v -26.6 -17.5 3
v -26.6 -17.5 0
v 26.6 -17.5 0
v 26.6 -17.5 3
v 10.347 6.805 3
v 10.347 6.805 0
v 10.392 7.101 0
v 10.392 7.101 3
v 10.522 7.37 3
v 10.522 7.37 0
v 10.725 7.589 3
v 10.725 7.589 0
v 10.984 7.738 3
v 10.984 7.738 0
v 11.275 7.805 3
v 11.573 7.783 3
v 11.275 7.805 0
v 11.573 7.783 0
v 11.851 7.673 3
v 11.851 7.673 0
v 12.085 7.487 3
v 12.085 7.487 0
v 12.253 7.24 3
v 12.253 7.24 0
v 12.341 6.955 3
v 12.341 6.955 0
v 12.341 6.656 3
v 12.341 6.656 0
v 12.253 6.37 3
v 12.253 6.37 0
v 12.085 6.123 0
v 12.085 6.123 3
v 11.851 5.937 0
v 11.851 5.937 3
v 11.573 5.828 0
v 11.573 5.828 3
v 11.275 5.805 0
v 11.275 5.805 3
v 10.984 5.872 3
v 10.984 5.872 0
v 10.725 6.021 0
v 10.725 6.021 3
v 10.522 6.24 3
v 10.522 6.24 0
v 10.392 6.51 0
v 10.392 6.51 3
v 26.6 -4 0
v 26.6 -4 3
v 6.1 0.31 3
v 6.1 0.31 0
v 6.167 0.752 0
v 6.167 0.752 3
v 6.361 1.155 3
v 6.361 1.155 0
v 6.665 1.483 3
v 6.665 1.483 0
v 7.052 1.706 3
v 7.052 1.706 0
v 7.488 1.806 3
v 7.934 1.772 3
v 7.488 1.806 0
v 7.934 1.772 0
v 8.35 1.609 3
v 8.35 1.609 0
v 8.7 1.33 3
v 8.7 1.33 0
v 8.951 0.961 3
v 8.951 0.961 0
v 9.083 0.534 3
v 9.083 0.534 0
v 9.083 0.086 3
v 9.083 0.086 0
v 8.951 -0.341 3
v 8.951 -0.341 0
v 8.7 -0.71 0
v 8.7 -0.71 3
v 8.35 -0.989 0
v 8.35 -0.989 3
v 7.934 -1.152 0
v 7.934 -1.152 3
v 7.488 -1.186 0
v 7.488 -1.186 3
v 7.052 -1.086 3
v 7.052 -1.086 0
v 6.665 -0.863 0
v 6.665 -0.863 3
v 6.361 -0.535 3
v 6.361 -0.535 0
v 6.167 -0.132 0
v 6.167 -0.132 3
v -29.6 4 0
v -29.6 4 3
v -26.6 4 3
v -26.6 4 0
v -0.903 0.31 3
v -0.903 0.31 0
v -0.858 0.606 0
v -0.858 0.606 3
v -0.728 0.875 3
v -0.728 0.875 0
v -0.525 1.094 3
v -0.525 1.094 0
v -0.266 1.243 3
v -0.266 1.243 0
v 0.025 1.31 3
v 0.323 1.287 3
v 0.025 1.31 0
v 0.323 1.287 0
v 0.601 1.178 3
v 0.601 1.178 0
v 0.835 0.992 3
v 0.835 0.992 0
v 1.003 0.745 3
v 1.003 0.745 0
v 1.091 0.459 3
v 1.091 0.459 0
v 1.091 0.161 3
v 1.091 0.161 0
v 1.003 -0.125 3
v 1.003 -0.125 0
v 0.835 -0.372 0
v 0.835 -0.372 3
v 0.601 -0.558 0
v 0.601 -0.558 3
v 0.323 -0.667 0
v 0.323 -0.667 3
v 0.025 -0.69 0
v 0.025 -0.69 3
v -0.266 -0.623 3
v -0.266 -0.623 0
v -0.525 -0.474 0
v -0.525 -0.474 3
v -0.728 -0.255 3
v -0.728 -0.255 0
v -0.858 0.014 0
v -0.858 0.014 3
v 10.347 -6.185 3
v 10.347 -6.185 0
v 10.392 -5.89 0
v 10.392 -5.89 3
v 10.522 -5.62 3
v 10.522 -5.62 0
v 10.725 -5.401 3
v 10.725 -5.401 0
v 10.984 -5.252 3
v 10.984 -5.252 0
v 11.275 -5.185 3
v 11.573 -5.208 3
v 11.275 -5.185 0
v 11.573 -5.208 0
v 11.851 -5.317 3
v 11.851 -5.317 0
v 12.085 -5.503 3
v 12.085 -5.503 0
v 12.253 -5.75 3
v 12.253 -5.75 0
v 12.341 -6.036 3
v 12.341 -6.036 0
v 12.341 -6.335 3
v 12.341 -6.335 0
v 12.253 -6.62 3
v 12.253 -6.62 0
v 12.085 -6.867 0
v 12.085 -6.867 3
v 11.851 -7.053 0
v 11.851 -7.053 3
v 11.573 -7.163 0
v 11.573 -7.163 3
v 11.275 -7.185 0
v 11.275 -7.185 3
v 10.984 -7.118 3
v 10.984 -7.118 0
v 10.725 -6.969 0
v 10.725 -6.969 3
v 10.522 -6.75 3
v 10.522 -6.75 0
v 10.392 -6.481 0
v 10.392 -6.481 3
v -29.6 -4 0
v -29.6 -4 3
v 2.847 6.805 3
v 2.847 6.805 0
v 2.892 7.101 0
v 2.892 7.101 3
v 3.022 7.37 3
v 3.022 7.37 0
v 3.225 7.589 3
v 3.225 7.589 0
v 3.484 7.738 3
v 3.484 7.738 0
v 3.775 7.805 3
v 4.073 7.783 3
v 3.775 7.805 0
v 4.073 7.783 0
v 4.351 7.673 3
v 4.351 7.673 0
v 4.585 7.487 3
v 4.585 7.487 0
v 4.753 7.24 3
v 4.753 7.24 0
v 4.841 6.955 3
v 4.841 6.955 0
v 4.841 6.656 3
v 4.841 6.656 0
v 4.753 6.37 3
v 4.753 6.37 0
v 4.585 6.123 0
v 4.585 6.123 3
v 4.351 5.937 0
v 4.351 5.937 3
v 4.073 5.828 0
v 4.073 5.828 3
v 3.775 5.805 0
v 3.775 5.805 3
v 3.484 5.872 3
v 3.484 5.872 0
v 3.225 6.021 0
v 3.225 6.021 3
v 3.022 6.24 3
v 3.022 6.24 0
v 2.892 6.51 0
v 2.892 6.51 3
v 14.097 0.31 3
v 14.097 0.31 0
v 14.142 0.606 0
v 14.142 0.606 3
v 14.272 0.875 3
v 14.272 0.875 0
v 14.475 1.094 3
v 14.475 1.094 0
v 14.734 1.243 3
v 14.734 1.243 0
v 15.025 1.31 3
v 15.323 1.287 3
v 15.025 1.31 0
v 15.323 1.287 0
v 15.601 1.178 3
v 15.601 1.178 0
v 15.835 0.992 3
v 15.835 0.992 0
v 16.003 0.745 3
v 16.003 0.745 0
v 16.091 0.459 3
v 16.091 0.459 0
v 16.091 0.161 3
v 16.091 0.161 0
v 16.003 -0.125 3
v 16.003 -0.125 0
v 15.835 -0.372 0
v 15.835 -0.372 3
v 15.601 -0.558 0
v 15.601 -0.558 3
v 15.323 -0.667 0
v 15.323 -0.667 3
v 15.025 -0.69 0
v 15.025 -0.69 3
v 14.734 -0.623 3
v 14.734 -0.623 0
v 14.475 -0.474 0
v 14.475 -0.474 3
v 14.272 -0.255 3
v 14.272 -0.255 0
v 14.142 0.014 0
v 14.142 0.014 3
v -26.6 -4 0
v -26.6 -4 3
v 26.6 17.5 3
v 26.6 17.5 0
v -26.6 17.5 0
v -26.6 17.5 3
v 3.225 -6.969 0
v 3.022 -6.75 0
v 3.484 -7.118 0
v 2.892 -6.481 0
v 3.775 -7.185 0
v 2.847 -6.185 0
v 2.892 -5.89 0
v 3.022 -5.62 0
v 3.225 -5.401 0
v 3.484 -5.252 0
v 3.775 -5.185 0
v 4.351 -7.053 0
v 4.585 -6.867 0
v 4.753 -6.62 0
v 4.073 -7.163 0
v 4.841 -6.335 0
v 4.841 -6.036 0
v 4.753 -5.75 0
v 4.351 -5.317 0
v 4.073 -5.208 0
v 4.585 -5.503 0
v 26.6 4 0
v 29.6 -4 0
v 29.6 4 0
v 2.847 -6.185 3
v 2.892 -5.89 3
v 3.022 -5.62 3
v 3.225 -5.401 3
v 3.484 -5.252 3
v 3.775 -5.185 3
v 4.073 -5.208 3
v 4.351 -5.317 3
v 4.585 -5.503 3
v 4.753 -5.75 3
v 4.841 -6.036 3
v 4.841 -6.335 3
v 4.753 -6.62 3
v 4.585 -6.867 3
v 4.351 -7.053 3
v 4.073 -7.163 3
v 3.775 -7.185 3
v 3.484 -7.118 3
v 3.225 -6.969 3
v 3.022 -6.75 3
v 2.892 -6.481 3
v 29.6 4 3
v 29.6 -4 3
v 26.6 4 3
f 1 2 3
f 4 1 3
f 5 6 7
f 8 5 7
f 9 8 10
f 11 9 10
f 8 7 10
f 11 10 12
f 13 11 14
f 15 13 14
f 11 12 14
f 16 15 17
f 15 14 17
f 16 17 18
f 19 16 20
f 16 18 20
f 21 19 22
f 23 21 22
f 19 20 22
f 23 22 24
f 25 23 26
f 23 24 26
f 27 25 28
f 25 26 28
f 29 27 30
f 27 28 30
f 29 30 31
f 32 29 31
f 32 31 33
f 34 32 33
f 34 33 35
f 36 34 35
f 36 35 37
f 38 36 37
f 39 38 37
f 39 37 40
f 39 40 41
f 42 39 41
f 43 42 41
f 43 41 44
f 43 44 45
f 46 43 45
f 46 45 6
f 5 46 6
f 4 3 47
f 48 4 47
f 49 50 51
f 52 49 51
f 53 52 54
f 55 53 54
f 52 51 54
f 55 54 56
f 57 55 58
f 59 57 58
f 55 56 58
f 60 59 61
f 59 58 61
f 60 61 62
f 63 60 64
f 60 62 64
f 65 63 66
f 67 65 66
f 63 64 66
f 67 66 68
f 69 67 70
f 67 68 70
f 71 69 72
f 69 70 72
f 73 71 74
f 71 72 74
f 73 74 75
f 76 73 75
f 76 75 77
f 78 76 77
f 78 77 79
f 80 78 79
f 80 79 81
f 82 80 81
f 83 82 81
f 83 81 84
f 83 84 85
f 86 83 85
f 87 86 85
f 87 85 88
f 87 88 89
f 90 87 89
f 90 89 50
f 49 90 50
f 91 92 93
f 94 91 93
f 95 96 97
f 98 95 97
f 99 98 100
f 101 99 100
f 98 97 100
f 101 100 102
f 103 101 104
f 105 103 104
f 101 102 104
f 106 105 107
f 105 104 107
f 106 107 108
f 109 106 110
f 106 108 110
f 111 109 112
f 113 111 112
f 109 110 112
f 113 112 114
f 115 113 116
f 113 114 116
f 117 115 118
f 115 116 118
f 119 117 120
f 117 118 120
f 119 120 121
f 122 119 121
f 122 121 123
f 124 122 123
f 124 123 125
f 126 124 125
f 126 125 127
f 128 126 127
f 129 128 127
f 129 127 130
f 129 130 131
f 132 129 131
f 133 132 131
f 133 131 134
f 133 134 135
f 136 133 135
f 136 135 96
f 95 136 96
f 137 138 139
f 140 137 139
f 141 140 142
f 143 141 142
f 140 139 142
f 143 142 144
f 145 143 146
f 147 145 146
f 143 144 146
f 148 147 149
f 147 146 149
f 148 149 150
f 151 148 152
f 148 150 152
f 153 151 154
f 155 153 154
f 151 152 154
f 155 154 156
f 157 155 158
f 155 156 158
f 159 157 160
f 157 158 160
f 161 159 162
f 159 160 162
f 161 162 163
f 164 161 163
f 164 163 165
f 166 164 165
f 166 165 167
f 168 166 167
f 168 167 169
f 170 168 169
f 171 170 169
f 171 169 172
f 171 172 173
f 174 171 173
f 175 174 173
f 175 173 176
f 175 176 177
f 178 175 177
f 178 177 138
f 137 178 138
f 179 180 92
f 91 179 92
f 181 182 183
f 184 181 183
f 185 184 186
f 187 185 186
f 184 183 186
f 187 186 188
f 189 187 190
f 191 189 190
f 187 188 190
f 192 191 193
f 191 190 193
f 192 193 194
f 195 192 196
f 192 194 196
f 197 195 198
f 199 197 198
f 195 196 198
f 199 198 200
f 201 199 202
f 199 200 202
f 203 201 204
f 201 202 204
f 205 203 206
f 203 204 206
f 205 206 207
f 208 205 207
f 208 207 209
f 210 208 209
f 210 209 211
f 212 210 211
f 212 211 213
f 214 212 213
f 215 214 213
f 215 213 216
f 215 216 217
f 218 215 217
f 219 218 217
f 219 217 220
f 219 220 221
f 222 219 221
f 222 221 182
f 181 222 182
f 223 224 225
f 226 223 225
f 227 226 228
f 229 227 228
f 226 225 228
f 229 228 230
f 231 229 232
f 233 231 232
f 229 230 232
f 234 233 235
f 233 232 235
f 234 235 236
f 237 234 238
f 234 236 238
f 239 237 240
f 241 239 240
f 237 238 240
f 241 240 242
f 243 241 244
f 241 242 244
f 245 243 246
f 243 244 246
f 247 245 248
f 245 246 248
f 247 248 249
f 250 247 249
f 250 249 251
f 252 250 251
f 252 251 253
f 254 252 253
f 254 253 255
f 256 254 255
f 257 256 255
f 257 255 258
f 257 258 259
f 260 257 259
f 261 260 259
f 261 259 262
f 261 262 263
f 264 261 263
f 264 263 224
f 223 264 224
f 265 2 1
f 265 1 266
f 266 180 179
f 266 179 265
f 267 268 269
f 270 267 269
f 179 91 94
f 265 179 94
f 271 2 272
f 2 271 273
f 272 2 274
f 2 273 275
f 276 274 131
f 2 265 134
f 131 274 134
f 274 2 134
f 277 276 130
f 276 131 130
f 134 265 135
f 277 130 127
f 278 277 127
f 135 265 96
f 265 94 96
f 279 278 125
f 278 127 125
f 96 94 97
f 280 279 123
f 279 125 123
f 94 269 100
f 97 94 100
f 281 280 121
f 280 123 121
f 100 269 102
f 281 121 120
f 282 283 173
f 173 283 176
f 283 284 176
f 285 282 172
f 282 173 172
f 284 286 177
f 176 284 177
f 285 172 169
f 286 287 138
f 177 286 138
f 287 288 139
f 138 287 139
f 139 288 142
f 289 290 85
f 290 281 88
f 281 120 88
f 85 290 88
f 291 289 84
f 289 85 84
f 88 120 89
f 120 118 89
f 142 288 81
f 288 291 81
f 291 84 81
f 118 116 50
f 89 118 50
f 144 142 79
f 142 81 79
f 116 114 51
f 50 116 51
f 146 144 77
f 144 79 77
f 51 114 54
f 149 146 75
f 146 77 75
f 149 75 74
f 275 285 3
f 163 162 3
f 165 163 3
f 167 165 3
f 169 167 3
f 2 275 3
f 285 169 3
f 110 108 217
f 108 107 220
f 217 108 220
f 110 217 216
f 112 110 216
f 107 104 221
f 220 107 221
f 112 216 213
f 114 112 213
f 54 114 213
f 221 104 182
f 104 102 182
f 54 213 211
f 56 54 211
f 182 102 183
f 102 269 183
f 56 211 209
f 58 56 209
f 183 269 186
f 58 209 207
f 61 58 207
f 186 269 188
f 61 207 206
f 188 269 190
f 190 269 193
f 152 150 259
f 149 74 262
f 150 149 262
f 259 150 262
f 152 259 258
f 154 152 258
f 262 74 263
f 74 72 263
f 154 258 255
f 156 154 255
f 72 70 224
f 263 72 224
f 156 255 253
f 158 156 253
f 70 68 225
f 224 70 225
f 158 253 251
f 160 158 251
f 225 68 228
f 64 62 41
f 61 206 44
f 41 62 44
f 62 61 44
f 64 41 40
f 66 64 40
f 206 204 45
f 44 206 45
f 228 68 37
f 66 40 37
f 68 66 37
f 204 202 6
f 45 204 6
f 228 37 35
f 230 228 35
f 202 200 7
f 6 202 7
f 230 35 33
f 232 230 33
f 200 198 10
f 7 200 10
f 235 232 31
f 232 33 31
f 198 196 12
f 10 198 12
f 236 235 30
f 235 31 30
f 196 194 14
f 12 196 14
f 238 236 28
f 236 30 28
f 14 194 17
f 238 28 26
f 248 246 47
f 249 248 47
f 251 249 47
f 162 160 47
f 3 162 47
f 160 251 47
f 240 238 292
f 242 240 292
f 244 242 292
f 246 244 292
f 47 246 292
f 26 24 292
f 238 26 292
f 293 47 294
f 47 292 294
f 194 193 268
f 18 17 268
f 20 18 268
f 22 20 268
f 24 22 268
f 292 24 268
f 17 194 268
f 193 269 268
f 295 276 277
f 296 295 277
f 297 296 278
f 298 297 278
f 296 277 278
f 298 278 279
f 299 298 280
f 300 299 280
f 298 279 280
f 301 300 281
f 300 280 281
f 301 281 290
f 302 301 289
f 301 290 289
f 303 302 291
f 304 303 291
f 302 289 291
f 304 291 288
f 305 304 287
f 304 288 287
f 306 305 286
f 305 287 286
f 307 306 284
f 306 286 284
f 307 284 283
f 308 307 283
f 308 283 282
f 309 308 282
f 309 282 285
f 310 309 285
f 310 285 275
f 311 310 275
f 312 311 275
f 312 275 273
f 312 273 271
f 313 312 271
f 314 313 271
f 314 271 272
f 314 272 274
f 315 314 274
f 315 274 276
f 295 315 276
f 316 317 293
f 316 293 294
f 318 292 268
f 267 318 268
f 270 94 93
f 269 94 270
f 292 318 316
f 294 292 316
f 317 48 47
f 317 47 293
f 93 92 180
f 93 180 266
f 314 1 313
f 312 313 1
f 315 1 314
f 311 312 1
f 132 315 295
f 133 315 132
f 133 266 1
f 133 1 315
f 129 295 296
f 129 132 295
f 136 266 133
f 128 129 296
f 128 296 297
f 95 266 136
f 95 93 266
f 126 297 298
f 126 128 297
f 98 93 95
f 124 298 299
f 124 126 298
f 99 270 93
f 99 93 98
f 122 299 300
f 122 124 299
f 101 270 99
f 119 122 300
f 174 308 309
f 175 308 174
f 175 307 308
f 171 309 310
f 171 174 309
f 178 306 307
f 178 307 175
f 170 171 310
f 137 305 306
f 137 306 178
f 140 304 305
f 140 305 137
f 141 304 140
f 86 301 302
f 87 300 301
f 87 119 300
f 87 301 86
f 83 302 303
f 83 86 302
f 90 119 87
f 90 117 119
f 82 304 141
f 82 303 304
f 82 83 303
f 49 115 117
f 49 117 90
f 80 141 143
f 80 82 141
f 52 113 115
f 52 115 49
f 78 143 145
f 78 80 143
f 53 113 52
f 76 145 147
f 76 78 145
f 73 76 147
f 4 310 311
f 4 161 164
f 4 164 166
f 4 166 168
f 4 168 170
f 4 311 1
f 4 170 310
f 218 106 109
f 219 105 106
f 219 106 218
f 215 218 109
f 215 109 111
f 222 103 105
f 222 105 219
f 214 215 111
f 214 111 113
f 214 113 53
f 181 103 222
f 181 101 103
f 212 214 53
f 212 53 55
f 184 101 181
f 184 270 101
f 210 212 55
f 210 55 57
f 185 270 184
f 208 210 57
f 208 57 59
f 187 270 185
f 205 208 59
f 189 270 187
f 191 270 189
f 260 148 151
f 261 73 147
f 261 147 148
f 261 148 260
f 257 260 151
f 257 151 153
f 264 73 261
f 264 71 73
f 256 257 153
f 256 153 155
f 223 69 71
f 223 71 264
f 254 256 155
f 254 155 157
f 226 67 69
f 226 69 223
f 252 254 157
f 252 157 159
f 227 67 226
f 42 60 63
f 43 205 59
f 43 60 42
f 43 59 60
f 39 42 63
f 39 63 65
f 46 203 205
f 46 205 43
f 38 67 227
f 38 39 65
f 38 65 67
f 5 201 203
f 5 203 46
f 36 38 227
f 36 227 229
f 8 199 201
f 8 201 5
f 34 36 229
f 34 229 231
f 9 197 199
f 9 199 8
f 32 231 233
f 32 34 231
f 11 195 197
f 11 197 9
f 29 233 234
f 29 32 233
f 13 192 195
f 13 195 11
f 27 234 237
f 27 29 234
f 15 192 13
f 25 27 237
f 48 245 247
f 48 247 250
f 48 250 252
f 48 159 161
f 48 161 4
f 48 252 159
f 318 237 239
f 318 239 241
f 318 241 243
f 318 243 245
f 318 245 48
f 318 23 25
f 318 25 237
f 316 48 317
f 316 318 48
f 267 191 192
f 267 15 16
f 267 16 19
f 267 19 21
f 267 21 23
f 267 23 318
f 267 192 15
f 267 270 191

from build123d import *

# Parameters (mm, degrees)
SALIENTE_EXTRUIR1_DEPTH = 3
CORTAR_EXTRUIR1_REACH   = 36.517
CROQUIS2_R              = 1.5
CROQUIS2_R_2            = 1.002612495
CORTAR_EXTRUIR2_START   = -3
CROQUIS3_W              = 3
CROQUIS3_H              = 35
CORTAR_EXTRUIR2_DEPTH   = 3
CROQUIS4_W              = 3
CROQUIS4_H              = 8
SALIENTE_EXTRUIR2_DEPTH = 3


with BuildPart() as part:
    # Croquis1 → Saliente-Extruir1 (new body)
    with BuildSketch(Plane.XY):
        Polygon((29.6, -12.5), (26.6, -12.5), (26.6, -7.5), (29.6, -7.5), (29.6, -2.5), (26.6, -2.5), (26.6, 2.5), (29.6, 2.5), (29.6, 7.5), (26.6, 7.5), (26.6, 12.5), (29.6, 12.5), (29.6, 17.5), (-29.6, 17.5), (-29.6, 12.5), (-26.6, 12.5), (-26.6, 7.5), (-29.6, 7.5), (-29.6, 2.5), (-26.6, 2.5), (-26.6, -2.5), (-29.6, -2.5), (-29.6, -7.5), (-26.6, -7.5), (-26.6, -12.5), (-29.6, -12.5), (-29.6, -17.5), (29.6, -17.5), align=None)
    extrude(amount=SALIENTE_EXTRUIR1_DEPTH)

    # Croquis2 → Cortar-Extruir1 (cut, up to next)
    with BuildSketch(Plane(origin=(0, 0, 0), x_dir=(-1, 0, 0), z_dir=(0, 0, -1)), mode=Mode.PRIVATE) as cortar_extruir1_sk1:
        with Locations((-7.6, 0.31)):
            Circle(CROQUIS2_R)
    cortar_extruir1_tool1 = extrude(cortar_extruir1_sk1.sketch, amount=-CORTAR_EXTRUIR1_REACH, mode=Mode.PRIVATE) & part.part
    # Croquis2 → Cortar-Extruir1 (cut, up to next)
    with BuildSketch(Plane(origin=(0, 0, 0), x_dir=(-1, 0, 0), z_dir=(0, 0, -1)), mode=Mode.PRIVATE) as cortar_extruir1_sk2:
        with Locations((-15.1, 0.31)):
            Circle(CROQUIS2_R_2)
    cortar_extruir1_tool2 = extrude(cortar_extruir1_sk2.sketch, amount=-CORTAR_EXTRUIR1_REACH, mode=Mode.PRIVATE) & part.part
    # Croquis2 → Cortar-Extruir1 (cut, up to next)
    with BuildSketch(Plane(origin=(0, 0, 0), x_dir=(-1, 0, 0), z_dir=(0, 0, -1)), mode=Mode.PRIVATE) as cortar_extruir1_sk3:
        with Locations((-11.35, 6.805190528)):
            Circle(CROQUIS2_R_2)
    cortar_extruir1_tool3 = extrude(cortar_extruir1_sk3.sketch, amount=-CORTAR_EXTRUIR1_REACH, mode=Mode.PRIVATE) & part.part
    # Croquis2 → Cortar-Extruir1 (cut, up to next)
    with BuildSketch(Plane(origin=(0, 0, 0), x_dir=(-1, 0, 0), z_dir=(0, 0, -1)), mode=Mode.PRIVATE) as cortar_extruir1_sk4:
        with Locations((-3.85, 6.805190528)):
            Circle(CROQUIS2_R_2)
    cortar_extruir1_tool4 = extrude(cortar_extruir1_sk4.sketch, amount=-CORTAR_EXTRUIR1_REACH, mode=Mode.PRIVATE) & part.part
    # Croquis2 → Cortar-Extruir1 (cut, up to next)
    with BuildSketch(Plane(origin=(0, 0, 0), x_dir=(-1, 0, 0), z_dir=(0, 0, -1)), mode=Mode.PRIVATE) as cortar_extruir1_sk5:
        with Locations((-0.1, 0.31)):
            Circle(CROQUIS2_R_2)
    cortar_extruir1_tool5 = extrude(cortar_extruir1_sk5.sketch, amount=-CORTAR_EXTRUIR1_REACH, mode=Mode.PRIVATE) & part.part
    # Croquis2 → Cortar-Extruir1 (cut, up to next)
    with BuildSketch(Plane(origin=(0, 0, 0), x_dir=(-1, 0, 0), z_dir=(0, 0, -1)), mode=Mode.PRIVATE) as cortar_extruir1_sk6:
        with Locations((-3.85, -6.185190528)):
            Circle(CROQUIS2_R_2)
    cortar_extruir1_tool6 = extrude(cortar_extruir1_sk6.sketch, amount=-CORTAR_EXTRUIR1_REACH, mode=Mode.PRIVATE) & part.part
    # Croquis2 → Cortar-Extruir1 (cut, up to next)
    with BuildSketch(Plane(origin=(0, 0, 0), x_dir=(-1, 0, 0), z_dir=(0, 0, -1)), mode=Mode.PRIVATE) as cortar_extruir1_sk7:
        with Locations((-11.35, -6.185190528)):
            Circle(CROQUIS2_R_2)
    cortar_extruir1_tool7 = extrude(cortar_extruir1_sk7.sketch, amount=-CORTAR_EXTRUIR1_REACH, mode=Mode.PRIVATE) & part.part
    add(cortar_extruir1_tool1.solids().sort_by_distance((7.6, 0.31, 0))[0], mode=Mode.SUBTRACT)
    add(cortar_extruir1_tool2.solids().sort_by_distance((15.1, 0.31, 0))[0], mode=Mode.SUBTRACT)
    add(cortar_extruir1_tool3.solids().sort_by_distance((11.35, 6.805191, 0))[0], mode=Mode.SUBTRACT)
    add(cortar_extruir1_tool4.solids().sort_by_distance((3.85, 6.805191, 0))[0], mode=Mode.SUBTRACT)
    add(cortar_extruir1_tool5.solids().sort_by_distance((0.1, 0.31, 0))[0], mode=Mode.SUBTRACT)
    add(cortar_extruir1_tool6.solids().sort_by_distance((3.85, -6.185191, 0))[0], mode=Mode.SUBTRACT)
    add(cortar_extruir1_tool7.solids().sort_by_distance((11.35, -6.185191, 0))[0], mode=Mode.SUBTRACT)

    # Croquis3 → Cortar-Extruir2 (cut)
    with BuildSketch(Plane.XY.offset(3).offset(CORTAR_EXTRUIR2_START)):
        with Locations((-28.1, 0)):
            Rectangle(CROQUIS3_W, CROQUIS3_H)
        with Locations((28.1, 0)):
            Rectangle(CROQUIS3_W, CROQUIS3_H)
    extrude(amount=CORTAR_EXTRUIR2_DEPTH, mode=Mode.SUBTRACT)

    # Croquis4 → Saliente-Extruir2 (add)
    with BuildSketch(Plane.XY.offset(3)):
        with Locations((28.1, 0)):
            Rectangle(CROQUIS4_W, CROQUIS4_H)
        with Locations((-28.1, 0)):
            Rectangle(CROQUIS4_W, CROQUIS4_H)
    extrude(amount=-SALIENTE_EXTRUIR2_DEPTH)


solid = part.part
